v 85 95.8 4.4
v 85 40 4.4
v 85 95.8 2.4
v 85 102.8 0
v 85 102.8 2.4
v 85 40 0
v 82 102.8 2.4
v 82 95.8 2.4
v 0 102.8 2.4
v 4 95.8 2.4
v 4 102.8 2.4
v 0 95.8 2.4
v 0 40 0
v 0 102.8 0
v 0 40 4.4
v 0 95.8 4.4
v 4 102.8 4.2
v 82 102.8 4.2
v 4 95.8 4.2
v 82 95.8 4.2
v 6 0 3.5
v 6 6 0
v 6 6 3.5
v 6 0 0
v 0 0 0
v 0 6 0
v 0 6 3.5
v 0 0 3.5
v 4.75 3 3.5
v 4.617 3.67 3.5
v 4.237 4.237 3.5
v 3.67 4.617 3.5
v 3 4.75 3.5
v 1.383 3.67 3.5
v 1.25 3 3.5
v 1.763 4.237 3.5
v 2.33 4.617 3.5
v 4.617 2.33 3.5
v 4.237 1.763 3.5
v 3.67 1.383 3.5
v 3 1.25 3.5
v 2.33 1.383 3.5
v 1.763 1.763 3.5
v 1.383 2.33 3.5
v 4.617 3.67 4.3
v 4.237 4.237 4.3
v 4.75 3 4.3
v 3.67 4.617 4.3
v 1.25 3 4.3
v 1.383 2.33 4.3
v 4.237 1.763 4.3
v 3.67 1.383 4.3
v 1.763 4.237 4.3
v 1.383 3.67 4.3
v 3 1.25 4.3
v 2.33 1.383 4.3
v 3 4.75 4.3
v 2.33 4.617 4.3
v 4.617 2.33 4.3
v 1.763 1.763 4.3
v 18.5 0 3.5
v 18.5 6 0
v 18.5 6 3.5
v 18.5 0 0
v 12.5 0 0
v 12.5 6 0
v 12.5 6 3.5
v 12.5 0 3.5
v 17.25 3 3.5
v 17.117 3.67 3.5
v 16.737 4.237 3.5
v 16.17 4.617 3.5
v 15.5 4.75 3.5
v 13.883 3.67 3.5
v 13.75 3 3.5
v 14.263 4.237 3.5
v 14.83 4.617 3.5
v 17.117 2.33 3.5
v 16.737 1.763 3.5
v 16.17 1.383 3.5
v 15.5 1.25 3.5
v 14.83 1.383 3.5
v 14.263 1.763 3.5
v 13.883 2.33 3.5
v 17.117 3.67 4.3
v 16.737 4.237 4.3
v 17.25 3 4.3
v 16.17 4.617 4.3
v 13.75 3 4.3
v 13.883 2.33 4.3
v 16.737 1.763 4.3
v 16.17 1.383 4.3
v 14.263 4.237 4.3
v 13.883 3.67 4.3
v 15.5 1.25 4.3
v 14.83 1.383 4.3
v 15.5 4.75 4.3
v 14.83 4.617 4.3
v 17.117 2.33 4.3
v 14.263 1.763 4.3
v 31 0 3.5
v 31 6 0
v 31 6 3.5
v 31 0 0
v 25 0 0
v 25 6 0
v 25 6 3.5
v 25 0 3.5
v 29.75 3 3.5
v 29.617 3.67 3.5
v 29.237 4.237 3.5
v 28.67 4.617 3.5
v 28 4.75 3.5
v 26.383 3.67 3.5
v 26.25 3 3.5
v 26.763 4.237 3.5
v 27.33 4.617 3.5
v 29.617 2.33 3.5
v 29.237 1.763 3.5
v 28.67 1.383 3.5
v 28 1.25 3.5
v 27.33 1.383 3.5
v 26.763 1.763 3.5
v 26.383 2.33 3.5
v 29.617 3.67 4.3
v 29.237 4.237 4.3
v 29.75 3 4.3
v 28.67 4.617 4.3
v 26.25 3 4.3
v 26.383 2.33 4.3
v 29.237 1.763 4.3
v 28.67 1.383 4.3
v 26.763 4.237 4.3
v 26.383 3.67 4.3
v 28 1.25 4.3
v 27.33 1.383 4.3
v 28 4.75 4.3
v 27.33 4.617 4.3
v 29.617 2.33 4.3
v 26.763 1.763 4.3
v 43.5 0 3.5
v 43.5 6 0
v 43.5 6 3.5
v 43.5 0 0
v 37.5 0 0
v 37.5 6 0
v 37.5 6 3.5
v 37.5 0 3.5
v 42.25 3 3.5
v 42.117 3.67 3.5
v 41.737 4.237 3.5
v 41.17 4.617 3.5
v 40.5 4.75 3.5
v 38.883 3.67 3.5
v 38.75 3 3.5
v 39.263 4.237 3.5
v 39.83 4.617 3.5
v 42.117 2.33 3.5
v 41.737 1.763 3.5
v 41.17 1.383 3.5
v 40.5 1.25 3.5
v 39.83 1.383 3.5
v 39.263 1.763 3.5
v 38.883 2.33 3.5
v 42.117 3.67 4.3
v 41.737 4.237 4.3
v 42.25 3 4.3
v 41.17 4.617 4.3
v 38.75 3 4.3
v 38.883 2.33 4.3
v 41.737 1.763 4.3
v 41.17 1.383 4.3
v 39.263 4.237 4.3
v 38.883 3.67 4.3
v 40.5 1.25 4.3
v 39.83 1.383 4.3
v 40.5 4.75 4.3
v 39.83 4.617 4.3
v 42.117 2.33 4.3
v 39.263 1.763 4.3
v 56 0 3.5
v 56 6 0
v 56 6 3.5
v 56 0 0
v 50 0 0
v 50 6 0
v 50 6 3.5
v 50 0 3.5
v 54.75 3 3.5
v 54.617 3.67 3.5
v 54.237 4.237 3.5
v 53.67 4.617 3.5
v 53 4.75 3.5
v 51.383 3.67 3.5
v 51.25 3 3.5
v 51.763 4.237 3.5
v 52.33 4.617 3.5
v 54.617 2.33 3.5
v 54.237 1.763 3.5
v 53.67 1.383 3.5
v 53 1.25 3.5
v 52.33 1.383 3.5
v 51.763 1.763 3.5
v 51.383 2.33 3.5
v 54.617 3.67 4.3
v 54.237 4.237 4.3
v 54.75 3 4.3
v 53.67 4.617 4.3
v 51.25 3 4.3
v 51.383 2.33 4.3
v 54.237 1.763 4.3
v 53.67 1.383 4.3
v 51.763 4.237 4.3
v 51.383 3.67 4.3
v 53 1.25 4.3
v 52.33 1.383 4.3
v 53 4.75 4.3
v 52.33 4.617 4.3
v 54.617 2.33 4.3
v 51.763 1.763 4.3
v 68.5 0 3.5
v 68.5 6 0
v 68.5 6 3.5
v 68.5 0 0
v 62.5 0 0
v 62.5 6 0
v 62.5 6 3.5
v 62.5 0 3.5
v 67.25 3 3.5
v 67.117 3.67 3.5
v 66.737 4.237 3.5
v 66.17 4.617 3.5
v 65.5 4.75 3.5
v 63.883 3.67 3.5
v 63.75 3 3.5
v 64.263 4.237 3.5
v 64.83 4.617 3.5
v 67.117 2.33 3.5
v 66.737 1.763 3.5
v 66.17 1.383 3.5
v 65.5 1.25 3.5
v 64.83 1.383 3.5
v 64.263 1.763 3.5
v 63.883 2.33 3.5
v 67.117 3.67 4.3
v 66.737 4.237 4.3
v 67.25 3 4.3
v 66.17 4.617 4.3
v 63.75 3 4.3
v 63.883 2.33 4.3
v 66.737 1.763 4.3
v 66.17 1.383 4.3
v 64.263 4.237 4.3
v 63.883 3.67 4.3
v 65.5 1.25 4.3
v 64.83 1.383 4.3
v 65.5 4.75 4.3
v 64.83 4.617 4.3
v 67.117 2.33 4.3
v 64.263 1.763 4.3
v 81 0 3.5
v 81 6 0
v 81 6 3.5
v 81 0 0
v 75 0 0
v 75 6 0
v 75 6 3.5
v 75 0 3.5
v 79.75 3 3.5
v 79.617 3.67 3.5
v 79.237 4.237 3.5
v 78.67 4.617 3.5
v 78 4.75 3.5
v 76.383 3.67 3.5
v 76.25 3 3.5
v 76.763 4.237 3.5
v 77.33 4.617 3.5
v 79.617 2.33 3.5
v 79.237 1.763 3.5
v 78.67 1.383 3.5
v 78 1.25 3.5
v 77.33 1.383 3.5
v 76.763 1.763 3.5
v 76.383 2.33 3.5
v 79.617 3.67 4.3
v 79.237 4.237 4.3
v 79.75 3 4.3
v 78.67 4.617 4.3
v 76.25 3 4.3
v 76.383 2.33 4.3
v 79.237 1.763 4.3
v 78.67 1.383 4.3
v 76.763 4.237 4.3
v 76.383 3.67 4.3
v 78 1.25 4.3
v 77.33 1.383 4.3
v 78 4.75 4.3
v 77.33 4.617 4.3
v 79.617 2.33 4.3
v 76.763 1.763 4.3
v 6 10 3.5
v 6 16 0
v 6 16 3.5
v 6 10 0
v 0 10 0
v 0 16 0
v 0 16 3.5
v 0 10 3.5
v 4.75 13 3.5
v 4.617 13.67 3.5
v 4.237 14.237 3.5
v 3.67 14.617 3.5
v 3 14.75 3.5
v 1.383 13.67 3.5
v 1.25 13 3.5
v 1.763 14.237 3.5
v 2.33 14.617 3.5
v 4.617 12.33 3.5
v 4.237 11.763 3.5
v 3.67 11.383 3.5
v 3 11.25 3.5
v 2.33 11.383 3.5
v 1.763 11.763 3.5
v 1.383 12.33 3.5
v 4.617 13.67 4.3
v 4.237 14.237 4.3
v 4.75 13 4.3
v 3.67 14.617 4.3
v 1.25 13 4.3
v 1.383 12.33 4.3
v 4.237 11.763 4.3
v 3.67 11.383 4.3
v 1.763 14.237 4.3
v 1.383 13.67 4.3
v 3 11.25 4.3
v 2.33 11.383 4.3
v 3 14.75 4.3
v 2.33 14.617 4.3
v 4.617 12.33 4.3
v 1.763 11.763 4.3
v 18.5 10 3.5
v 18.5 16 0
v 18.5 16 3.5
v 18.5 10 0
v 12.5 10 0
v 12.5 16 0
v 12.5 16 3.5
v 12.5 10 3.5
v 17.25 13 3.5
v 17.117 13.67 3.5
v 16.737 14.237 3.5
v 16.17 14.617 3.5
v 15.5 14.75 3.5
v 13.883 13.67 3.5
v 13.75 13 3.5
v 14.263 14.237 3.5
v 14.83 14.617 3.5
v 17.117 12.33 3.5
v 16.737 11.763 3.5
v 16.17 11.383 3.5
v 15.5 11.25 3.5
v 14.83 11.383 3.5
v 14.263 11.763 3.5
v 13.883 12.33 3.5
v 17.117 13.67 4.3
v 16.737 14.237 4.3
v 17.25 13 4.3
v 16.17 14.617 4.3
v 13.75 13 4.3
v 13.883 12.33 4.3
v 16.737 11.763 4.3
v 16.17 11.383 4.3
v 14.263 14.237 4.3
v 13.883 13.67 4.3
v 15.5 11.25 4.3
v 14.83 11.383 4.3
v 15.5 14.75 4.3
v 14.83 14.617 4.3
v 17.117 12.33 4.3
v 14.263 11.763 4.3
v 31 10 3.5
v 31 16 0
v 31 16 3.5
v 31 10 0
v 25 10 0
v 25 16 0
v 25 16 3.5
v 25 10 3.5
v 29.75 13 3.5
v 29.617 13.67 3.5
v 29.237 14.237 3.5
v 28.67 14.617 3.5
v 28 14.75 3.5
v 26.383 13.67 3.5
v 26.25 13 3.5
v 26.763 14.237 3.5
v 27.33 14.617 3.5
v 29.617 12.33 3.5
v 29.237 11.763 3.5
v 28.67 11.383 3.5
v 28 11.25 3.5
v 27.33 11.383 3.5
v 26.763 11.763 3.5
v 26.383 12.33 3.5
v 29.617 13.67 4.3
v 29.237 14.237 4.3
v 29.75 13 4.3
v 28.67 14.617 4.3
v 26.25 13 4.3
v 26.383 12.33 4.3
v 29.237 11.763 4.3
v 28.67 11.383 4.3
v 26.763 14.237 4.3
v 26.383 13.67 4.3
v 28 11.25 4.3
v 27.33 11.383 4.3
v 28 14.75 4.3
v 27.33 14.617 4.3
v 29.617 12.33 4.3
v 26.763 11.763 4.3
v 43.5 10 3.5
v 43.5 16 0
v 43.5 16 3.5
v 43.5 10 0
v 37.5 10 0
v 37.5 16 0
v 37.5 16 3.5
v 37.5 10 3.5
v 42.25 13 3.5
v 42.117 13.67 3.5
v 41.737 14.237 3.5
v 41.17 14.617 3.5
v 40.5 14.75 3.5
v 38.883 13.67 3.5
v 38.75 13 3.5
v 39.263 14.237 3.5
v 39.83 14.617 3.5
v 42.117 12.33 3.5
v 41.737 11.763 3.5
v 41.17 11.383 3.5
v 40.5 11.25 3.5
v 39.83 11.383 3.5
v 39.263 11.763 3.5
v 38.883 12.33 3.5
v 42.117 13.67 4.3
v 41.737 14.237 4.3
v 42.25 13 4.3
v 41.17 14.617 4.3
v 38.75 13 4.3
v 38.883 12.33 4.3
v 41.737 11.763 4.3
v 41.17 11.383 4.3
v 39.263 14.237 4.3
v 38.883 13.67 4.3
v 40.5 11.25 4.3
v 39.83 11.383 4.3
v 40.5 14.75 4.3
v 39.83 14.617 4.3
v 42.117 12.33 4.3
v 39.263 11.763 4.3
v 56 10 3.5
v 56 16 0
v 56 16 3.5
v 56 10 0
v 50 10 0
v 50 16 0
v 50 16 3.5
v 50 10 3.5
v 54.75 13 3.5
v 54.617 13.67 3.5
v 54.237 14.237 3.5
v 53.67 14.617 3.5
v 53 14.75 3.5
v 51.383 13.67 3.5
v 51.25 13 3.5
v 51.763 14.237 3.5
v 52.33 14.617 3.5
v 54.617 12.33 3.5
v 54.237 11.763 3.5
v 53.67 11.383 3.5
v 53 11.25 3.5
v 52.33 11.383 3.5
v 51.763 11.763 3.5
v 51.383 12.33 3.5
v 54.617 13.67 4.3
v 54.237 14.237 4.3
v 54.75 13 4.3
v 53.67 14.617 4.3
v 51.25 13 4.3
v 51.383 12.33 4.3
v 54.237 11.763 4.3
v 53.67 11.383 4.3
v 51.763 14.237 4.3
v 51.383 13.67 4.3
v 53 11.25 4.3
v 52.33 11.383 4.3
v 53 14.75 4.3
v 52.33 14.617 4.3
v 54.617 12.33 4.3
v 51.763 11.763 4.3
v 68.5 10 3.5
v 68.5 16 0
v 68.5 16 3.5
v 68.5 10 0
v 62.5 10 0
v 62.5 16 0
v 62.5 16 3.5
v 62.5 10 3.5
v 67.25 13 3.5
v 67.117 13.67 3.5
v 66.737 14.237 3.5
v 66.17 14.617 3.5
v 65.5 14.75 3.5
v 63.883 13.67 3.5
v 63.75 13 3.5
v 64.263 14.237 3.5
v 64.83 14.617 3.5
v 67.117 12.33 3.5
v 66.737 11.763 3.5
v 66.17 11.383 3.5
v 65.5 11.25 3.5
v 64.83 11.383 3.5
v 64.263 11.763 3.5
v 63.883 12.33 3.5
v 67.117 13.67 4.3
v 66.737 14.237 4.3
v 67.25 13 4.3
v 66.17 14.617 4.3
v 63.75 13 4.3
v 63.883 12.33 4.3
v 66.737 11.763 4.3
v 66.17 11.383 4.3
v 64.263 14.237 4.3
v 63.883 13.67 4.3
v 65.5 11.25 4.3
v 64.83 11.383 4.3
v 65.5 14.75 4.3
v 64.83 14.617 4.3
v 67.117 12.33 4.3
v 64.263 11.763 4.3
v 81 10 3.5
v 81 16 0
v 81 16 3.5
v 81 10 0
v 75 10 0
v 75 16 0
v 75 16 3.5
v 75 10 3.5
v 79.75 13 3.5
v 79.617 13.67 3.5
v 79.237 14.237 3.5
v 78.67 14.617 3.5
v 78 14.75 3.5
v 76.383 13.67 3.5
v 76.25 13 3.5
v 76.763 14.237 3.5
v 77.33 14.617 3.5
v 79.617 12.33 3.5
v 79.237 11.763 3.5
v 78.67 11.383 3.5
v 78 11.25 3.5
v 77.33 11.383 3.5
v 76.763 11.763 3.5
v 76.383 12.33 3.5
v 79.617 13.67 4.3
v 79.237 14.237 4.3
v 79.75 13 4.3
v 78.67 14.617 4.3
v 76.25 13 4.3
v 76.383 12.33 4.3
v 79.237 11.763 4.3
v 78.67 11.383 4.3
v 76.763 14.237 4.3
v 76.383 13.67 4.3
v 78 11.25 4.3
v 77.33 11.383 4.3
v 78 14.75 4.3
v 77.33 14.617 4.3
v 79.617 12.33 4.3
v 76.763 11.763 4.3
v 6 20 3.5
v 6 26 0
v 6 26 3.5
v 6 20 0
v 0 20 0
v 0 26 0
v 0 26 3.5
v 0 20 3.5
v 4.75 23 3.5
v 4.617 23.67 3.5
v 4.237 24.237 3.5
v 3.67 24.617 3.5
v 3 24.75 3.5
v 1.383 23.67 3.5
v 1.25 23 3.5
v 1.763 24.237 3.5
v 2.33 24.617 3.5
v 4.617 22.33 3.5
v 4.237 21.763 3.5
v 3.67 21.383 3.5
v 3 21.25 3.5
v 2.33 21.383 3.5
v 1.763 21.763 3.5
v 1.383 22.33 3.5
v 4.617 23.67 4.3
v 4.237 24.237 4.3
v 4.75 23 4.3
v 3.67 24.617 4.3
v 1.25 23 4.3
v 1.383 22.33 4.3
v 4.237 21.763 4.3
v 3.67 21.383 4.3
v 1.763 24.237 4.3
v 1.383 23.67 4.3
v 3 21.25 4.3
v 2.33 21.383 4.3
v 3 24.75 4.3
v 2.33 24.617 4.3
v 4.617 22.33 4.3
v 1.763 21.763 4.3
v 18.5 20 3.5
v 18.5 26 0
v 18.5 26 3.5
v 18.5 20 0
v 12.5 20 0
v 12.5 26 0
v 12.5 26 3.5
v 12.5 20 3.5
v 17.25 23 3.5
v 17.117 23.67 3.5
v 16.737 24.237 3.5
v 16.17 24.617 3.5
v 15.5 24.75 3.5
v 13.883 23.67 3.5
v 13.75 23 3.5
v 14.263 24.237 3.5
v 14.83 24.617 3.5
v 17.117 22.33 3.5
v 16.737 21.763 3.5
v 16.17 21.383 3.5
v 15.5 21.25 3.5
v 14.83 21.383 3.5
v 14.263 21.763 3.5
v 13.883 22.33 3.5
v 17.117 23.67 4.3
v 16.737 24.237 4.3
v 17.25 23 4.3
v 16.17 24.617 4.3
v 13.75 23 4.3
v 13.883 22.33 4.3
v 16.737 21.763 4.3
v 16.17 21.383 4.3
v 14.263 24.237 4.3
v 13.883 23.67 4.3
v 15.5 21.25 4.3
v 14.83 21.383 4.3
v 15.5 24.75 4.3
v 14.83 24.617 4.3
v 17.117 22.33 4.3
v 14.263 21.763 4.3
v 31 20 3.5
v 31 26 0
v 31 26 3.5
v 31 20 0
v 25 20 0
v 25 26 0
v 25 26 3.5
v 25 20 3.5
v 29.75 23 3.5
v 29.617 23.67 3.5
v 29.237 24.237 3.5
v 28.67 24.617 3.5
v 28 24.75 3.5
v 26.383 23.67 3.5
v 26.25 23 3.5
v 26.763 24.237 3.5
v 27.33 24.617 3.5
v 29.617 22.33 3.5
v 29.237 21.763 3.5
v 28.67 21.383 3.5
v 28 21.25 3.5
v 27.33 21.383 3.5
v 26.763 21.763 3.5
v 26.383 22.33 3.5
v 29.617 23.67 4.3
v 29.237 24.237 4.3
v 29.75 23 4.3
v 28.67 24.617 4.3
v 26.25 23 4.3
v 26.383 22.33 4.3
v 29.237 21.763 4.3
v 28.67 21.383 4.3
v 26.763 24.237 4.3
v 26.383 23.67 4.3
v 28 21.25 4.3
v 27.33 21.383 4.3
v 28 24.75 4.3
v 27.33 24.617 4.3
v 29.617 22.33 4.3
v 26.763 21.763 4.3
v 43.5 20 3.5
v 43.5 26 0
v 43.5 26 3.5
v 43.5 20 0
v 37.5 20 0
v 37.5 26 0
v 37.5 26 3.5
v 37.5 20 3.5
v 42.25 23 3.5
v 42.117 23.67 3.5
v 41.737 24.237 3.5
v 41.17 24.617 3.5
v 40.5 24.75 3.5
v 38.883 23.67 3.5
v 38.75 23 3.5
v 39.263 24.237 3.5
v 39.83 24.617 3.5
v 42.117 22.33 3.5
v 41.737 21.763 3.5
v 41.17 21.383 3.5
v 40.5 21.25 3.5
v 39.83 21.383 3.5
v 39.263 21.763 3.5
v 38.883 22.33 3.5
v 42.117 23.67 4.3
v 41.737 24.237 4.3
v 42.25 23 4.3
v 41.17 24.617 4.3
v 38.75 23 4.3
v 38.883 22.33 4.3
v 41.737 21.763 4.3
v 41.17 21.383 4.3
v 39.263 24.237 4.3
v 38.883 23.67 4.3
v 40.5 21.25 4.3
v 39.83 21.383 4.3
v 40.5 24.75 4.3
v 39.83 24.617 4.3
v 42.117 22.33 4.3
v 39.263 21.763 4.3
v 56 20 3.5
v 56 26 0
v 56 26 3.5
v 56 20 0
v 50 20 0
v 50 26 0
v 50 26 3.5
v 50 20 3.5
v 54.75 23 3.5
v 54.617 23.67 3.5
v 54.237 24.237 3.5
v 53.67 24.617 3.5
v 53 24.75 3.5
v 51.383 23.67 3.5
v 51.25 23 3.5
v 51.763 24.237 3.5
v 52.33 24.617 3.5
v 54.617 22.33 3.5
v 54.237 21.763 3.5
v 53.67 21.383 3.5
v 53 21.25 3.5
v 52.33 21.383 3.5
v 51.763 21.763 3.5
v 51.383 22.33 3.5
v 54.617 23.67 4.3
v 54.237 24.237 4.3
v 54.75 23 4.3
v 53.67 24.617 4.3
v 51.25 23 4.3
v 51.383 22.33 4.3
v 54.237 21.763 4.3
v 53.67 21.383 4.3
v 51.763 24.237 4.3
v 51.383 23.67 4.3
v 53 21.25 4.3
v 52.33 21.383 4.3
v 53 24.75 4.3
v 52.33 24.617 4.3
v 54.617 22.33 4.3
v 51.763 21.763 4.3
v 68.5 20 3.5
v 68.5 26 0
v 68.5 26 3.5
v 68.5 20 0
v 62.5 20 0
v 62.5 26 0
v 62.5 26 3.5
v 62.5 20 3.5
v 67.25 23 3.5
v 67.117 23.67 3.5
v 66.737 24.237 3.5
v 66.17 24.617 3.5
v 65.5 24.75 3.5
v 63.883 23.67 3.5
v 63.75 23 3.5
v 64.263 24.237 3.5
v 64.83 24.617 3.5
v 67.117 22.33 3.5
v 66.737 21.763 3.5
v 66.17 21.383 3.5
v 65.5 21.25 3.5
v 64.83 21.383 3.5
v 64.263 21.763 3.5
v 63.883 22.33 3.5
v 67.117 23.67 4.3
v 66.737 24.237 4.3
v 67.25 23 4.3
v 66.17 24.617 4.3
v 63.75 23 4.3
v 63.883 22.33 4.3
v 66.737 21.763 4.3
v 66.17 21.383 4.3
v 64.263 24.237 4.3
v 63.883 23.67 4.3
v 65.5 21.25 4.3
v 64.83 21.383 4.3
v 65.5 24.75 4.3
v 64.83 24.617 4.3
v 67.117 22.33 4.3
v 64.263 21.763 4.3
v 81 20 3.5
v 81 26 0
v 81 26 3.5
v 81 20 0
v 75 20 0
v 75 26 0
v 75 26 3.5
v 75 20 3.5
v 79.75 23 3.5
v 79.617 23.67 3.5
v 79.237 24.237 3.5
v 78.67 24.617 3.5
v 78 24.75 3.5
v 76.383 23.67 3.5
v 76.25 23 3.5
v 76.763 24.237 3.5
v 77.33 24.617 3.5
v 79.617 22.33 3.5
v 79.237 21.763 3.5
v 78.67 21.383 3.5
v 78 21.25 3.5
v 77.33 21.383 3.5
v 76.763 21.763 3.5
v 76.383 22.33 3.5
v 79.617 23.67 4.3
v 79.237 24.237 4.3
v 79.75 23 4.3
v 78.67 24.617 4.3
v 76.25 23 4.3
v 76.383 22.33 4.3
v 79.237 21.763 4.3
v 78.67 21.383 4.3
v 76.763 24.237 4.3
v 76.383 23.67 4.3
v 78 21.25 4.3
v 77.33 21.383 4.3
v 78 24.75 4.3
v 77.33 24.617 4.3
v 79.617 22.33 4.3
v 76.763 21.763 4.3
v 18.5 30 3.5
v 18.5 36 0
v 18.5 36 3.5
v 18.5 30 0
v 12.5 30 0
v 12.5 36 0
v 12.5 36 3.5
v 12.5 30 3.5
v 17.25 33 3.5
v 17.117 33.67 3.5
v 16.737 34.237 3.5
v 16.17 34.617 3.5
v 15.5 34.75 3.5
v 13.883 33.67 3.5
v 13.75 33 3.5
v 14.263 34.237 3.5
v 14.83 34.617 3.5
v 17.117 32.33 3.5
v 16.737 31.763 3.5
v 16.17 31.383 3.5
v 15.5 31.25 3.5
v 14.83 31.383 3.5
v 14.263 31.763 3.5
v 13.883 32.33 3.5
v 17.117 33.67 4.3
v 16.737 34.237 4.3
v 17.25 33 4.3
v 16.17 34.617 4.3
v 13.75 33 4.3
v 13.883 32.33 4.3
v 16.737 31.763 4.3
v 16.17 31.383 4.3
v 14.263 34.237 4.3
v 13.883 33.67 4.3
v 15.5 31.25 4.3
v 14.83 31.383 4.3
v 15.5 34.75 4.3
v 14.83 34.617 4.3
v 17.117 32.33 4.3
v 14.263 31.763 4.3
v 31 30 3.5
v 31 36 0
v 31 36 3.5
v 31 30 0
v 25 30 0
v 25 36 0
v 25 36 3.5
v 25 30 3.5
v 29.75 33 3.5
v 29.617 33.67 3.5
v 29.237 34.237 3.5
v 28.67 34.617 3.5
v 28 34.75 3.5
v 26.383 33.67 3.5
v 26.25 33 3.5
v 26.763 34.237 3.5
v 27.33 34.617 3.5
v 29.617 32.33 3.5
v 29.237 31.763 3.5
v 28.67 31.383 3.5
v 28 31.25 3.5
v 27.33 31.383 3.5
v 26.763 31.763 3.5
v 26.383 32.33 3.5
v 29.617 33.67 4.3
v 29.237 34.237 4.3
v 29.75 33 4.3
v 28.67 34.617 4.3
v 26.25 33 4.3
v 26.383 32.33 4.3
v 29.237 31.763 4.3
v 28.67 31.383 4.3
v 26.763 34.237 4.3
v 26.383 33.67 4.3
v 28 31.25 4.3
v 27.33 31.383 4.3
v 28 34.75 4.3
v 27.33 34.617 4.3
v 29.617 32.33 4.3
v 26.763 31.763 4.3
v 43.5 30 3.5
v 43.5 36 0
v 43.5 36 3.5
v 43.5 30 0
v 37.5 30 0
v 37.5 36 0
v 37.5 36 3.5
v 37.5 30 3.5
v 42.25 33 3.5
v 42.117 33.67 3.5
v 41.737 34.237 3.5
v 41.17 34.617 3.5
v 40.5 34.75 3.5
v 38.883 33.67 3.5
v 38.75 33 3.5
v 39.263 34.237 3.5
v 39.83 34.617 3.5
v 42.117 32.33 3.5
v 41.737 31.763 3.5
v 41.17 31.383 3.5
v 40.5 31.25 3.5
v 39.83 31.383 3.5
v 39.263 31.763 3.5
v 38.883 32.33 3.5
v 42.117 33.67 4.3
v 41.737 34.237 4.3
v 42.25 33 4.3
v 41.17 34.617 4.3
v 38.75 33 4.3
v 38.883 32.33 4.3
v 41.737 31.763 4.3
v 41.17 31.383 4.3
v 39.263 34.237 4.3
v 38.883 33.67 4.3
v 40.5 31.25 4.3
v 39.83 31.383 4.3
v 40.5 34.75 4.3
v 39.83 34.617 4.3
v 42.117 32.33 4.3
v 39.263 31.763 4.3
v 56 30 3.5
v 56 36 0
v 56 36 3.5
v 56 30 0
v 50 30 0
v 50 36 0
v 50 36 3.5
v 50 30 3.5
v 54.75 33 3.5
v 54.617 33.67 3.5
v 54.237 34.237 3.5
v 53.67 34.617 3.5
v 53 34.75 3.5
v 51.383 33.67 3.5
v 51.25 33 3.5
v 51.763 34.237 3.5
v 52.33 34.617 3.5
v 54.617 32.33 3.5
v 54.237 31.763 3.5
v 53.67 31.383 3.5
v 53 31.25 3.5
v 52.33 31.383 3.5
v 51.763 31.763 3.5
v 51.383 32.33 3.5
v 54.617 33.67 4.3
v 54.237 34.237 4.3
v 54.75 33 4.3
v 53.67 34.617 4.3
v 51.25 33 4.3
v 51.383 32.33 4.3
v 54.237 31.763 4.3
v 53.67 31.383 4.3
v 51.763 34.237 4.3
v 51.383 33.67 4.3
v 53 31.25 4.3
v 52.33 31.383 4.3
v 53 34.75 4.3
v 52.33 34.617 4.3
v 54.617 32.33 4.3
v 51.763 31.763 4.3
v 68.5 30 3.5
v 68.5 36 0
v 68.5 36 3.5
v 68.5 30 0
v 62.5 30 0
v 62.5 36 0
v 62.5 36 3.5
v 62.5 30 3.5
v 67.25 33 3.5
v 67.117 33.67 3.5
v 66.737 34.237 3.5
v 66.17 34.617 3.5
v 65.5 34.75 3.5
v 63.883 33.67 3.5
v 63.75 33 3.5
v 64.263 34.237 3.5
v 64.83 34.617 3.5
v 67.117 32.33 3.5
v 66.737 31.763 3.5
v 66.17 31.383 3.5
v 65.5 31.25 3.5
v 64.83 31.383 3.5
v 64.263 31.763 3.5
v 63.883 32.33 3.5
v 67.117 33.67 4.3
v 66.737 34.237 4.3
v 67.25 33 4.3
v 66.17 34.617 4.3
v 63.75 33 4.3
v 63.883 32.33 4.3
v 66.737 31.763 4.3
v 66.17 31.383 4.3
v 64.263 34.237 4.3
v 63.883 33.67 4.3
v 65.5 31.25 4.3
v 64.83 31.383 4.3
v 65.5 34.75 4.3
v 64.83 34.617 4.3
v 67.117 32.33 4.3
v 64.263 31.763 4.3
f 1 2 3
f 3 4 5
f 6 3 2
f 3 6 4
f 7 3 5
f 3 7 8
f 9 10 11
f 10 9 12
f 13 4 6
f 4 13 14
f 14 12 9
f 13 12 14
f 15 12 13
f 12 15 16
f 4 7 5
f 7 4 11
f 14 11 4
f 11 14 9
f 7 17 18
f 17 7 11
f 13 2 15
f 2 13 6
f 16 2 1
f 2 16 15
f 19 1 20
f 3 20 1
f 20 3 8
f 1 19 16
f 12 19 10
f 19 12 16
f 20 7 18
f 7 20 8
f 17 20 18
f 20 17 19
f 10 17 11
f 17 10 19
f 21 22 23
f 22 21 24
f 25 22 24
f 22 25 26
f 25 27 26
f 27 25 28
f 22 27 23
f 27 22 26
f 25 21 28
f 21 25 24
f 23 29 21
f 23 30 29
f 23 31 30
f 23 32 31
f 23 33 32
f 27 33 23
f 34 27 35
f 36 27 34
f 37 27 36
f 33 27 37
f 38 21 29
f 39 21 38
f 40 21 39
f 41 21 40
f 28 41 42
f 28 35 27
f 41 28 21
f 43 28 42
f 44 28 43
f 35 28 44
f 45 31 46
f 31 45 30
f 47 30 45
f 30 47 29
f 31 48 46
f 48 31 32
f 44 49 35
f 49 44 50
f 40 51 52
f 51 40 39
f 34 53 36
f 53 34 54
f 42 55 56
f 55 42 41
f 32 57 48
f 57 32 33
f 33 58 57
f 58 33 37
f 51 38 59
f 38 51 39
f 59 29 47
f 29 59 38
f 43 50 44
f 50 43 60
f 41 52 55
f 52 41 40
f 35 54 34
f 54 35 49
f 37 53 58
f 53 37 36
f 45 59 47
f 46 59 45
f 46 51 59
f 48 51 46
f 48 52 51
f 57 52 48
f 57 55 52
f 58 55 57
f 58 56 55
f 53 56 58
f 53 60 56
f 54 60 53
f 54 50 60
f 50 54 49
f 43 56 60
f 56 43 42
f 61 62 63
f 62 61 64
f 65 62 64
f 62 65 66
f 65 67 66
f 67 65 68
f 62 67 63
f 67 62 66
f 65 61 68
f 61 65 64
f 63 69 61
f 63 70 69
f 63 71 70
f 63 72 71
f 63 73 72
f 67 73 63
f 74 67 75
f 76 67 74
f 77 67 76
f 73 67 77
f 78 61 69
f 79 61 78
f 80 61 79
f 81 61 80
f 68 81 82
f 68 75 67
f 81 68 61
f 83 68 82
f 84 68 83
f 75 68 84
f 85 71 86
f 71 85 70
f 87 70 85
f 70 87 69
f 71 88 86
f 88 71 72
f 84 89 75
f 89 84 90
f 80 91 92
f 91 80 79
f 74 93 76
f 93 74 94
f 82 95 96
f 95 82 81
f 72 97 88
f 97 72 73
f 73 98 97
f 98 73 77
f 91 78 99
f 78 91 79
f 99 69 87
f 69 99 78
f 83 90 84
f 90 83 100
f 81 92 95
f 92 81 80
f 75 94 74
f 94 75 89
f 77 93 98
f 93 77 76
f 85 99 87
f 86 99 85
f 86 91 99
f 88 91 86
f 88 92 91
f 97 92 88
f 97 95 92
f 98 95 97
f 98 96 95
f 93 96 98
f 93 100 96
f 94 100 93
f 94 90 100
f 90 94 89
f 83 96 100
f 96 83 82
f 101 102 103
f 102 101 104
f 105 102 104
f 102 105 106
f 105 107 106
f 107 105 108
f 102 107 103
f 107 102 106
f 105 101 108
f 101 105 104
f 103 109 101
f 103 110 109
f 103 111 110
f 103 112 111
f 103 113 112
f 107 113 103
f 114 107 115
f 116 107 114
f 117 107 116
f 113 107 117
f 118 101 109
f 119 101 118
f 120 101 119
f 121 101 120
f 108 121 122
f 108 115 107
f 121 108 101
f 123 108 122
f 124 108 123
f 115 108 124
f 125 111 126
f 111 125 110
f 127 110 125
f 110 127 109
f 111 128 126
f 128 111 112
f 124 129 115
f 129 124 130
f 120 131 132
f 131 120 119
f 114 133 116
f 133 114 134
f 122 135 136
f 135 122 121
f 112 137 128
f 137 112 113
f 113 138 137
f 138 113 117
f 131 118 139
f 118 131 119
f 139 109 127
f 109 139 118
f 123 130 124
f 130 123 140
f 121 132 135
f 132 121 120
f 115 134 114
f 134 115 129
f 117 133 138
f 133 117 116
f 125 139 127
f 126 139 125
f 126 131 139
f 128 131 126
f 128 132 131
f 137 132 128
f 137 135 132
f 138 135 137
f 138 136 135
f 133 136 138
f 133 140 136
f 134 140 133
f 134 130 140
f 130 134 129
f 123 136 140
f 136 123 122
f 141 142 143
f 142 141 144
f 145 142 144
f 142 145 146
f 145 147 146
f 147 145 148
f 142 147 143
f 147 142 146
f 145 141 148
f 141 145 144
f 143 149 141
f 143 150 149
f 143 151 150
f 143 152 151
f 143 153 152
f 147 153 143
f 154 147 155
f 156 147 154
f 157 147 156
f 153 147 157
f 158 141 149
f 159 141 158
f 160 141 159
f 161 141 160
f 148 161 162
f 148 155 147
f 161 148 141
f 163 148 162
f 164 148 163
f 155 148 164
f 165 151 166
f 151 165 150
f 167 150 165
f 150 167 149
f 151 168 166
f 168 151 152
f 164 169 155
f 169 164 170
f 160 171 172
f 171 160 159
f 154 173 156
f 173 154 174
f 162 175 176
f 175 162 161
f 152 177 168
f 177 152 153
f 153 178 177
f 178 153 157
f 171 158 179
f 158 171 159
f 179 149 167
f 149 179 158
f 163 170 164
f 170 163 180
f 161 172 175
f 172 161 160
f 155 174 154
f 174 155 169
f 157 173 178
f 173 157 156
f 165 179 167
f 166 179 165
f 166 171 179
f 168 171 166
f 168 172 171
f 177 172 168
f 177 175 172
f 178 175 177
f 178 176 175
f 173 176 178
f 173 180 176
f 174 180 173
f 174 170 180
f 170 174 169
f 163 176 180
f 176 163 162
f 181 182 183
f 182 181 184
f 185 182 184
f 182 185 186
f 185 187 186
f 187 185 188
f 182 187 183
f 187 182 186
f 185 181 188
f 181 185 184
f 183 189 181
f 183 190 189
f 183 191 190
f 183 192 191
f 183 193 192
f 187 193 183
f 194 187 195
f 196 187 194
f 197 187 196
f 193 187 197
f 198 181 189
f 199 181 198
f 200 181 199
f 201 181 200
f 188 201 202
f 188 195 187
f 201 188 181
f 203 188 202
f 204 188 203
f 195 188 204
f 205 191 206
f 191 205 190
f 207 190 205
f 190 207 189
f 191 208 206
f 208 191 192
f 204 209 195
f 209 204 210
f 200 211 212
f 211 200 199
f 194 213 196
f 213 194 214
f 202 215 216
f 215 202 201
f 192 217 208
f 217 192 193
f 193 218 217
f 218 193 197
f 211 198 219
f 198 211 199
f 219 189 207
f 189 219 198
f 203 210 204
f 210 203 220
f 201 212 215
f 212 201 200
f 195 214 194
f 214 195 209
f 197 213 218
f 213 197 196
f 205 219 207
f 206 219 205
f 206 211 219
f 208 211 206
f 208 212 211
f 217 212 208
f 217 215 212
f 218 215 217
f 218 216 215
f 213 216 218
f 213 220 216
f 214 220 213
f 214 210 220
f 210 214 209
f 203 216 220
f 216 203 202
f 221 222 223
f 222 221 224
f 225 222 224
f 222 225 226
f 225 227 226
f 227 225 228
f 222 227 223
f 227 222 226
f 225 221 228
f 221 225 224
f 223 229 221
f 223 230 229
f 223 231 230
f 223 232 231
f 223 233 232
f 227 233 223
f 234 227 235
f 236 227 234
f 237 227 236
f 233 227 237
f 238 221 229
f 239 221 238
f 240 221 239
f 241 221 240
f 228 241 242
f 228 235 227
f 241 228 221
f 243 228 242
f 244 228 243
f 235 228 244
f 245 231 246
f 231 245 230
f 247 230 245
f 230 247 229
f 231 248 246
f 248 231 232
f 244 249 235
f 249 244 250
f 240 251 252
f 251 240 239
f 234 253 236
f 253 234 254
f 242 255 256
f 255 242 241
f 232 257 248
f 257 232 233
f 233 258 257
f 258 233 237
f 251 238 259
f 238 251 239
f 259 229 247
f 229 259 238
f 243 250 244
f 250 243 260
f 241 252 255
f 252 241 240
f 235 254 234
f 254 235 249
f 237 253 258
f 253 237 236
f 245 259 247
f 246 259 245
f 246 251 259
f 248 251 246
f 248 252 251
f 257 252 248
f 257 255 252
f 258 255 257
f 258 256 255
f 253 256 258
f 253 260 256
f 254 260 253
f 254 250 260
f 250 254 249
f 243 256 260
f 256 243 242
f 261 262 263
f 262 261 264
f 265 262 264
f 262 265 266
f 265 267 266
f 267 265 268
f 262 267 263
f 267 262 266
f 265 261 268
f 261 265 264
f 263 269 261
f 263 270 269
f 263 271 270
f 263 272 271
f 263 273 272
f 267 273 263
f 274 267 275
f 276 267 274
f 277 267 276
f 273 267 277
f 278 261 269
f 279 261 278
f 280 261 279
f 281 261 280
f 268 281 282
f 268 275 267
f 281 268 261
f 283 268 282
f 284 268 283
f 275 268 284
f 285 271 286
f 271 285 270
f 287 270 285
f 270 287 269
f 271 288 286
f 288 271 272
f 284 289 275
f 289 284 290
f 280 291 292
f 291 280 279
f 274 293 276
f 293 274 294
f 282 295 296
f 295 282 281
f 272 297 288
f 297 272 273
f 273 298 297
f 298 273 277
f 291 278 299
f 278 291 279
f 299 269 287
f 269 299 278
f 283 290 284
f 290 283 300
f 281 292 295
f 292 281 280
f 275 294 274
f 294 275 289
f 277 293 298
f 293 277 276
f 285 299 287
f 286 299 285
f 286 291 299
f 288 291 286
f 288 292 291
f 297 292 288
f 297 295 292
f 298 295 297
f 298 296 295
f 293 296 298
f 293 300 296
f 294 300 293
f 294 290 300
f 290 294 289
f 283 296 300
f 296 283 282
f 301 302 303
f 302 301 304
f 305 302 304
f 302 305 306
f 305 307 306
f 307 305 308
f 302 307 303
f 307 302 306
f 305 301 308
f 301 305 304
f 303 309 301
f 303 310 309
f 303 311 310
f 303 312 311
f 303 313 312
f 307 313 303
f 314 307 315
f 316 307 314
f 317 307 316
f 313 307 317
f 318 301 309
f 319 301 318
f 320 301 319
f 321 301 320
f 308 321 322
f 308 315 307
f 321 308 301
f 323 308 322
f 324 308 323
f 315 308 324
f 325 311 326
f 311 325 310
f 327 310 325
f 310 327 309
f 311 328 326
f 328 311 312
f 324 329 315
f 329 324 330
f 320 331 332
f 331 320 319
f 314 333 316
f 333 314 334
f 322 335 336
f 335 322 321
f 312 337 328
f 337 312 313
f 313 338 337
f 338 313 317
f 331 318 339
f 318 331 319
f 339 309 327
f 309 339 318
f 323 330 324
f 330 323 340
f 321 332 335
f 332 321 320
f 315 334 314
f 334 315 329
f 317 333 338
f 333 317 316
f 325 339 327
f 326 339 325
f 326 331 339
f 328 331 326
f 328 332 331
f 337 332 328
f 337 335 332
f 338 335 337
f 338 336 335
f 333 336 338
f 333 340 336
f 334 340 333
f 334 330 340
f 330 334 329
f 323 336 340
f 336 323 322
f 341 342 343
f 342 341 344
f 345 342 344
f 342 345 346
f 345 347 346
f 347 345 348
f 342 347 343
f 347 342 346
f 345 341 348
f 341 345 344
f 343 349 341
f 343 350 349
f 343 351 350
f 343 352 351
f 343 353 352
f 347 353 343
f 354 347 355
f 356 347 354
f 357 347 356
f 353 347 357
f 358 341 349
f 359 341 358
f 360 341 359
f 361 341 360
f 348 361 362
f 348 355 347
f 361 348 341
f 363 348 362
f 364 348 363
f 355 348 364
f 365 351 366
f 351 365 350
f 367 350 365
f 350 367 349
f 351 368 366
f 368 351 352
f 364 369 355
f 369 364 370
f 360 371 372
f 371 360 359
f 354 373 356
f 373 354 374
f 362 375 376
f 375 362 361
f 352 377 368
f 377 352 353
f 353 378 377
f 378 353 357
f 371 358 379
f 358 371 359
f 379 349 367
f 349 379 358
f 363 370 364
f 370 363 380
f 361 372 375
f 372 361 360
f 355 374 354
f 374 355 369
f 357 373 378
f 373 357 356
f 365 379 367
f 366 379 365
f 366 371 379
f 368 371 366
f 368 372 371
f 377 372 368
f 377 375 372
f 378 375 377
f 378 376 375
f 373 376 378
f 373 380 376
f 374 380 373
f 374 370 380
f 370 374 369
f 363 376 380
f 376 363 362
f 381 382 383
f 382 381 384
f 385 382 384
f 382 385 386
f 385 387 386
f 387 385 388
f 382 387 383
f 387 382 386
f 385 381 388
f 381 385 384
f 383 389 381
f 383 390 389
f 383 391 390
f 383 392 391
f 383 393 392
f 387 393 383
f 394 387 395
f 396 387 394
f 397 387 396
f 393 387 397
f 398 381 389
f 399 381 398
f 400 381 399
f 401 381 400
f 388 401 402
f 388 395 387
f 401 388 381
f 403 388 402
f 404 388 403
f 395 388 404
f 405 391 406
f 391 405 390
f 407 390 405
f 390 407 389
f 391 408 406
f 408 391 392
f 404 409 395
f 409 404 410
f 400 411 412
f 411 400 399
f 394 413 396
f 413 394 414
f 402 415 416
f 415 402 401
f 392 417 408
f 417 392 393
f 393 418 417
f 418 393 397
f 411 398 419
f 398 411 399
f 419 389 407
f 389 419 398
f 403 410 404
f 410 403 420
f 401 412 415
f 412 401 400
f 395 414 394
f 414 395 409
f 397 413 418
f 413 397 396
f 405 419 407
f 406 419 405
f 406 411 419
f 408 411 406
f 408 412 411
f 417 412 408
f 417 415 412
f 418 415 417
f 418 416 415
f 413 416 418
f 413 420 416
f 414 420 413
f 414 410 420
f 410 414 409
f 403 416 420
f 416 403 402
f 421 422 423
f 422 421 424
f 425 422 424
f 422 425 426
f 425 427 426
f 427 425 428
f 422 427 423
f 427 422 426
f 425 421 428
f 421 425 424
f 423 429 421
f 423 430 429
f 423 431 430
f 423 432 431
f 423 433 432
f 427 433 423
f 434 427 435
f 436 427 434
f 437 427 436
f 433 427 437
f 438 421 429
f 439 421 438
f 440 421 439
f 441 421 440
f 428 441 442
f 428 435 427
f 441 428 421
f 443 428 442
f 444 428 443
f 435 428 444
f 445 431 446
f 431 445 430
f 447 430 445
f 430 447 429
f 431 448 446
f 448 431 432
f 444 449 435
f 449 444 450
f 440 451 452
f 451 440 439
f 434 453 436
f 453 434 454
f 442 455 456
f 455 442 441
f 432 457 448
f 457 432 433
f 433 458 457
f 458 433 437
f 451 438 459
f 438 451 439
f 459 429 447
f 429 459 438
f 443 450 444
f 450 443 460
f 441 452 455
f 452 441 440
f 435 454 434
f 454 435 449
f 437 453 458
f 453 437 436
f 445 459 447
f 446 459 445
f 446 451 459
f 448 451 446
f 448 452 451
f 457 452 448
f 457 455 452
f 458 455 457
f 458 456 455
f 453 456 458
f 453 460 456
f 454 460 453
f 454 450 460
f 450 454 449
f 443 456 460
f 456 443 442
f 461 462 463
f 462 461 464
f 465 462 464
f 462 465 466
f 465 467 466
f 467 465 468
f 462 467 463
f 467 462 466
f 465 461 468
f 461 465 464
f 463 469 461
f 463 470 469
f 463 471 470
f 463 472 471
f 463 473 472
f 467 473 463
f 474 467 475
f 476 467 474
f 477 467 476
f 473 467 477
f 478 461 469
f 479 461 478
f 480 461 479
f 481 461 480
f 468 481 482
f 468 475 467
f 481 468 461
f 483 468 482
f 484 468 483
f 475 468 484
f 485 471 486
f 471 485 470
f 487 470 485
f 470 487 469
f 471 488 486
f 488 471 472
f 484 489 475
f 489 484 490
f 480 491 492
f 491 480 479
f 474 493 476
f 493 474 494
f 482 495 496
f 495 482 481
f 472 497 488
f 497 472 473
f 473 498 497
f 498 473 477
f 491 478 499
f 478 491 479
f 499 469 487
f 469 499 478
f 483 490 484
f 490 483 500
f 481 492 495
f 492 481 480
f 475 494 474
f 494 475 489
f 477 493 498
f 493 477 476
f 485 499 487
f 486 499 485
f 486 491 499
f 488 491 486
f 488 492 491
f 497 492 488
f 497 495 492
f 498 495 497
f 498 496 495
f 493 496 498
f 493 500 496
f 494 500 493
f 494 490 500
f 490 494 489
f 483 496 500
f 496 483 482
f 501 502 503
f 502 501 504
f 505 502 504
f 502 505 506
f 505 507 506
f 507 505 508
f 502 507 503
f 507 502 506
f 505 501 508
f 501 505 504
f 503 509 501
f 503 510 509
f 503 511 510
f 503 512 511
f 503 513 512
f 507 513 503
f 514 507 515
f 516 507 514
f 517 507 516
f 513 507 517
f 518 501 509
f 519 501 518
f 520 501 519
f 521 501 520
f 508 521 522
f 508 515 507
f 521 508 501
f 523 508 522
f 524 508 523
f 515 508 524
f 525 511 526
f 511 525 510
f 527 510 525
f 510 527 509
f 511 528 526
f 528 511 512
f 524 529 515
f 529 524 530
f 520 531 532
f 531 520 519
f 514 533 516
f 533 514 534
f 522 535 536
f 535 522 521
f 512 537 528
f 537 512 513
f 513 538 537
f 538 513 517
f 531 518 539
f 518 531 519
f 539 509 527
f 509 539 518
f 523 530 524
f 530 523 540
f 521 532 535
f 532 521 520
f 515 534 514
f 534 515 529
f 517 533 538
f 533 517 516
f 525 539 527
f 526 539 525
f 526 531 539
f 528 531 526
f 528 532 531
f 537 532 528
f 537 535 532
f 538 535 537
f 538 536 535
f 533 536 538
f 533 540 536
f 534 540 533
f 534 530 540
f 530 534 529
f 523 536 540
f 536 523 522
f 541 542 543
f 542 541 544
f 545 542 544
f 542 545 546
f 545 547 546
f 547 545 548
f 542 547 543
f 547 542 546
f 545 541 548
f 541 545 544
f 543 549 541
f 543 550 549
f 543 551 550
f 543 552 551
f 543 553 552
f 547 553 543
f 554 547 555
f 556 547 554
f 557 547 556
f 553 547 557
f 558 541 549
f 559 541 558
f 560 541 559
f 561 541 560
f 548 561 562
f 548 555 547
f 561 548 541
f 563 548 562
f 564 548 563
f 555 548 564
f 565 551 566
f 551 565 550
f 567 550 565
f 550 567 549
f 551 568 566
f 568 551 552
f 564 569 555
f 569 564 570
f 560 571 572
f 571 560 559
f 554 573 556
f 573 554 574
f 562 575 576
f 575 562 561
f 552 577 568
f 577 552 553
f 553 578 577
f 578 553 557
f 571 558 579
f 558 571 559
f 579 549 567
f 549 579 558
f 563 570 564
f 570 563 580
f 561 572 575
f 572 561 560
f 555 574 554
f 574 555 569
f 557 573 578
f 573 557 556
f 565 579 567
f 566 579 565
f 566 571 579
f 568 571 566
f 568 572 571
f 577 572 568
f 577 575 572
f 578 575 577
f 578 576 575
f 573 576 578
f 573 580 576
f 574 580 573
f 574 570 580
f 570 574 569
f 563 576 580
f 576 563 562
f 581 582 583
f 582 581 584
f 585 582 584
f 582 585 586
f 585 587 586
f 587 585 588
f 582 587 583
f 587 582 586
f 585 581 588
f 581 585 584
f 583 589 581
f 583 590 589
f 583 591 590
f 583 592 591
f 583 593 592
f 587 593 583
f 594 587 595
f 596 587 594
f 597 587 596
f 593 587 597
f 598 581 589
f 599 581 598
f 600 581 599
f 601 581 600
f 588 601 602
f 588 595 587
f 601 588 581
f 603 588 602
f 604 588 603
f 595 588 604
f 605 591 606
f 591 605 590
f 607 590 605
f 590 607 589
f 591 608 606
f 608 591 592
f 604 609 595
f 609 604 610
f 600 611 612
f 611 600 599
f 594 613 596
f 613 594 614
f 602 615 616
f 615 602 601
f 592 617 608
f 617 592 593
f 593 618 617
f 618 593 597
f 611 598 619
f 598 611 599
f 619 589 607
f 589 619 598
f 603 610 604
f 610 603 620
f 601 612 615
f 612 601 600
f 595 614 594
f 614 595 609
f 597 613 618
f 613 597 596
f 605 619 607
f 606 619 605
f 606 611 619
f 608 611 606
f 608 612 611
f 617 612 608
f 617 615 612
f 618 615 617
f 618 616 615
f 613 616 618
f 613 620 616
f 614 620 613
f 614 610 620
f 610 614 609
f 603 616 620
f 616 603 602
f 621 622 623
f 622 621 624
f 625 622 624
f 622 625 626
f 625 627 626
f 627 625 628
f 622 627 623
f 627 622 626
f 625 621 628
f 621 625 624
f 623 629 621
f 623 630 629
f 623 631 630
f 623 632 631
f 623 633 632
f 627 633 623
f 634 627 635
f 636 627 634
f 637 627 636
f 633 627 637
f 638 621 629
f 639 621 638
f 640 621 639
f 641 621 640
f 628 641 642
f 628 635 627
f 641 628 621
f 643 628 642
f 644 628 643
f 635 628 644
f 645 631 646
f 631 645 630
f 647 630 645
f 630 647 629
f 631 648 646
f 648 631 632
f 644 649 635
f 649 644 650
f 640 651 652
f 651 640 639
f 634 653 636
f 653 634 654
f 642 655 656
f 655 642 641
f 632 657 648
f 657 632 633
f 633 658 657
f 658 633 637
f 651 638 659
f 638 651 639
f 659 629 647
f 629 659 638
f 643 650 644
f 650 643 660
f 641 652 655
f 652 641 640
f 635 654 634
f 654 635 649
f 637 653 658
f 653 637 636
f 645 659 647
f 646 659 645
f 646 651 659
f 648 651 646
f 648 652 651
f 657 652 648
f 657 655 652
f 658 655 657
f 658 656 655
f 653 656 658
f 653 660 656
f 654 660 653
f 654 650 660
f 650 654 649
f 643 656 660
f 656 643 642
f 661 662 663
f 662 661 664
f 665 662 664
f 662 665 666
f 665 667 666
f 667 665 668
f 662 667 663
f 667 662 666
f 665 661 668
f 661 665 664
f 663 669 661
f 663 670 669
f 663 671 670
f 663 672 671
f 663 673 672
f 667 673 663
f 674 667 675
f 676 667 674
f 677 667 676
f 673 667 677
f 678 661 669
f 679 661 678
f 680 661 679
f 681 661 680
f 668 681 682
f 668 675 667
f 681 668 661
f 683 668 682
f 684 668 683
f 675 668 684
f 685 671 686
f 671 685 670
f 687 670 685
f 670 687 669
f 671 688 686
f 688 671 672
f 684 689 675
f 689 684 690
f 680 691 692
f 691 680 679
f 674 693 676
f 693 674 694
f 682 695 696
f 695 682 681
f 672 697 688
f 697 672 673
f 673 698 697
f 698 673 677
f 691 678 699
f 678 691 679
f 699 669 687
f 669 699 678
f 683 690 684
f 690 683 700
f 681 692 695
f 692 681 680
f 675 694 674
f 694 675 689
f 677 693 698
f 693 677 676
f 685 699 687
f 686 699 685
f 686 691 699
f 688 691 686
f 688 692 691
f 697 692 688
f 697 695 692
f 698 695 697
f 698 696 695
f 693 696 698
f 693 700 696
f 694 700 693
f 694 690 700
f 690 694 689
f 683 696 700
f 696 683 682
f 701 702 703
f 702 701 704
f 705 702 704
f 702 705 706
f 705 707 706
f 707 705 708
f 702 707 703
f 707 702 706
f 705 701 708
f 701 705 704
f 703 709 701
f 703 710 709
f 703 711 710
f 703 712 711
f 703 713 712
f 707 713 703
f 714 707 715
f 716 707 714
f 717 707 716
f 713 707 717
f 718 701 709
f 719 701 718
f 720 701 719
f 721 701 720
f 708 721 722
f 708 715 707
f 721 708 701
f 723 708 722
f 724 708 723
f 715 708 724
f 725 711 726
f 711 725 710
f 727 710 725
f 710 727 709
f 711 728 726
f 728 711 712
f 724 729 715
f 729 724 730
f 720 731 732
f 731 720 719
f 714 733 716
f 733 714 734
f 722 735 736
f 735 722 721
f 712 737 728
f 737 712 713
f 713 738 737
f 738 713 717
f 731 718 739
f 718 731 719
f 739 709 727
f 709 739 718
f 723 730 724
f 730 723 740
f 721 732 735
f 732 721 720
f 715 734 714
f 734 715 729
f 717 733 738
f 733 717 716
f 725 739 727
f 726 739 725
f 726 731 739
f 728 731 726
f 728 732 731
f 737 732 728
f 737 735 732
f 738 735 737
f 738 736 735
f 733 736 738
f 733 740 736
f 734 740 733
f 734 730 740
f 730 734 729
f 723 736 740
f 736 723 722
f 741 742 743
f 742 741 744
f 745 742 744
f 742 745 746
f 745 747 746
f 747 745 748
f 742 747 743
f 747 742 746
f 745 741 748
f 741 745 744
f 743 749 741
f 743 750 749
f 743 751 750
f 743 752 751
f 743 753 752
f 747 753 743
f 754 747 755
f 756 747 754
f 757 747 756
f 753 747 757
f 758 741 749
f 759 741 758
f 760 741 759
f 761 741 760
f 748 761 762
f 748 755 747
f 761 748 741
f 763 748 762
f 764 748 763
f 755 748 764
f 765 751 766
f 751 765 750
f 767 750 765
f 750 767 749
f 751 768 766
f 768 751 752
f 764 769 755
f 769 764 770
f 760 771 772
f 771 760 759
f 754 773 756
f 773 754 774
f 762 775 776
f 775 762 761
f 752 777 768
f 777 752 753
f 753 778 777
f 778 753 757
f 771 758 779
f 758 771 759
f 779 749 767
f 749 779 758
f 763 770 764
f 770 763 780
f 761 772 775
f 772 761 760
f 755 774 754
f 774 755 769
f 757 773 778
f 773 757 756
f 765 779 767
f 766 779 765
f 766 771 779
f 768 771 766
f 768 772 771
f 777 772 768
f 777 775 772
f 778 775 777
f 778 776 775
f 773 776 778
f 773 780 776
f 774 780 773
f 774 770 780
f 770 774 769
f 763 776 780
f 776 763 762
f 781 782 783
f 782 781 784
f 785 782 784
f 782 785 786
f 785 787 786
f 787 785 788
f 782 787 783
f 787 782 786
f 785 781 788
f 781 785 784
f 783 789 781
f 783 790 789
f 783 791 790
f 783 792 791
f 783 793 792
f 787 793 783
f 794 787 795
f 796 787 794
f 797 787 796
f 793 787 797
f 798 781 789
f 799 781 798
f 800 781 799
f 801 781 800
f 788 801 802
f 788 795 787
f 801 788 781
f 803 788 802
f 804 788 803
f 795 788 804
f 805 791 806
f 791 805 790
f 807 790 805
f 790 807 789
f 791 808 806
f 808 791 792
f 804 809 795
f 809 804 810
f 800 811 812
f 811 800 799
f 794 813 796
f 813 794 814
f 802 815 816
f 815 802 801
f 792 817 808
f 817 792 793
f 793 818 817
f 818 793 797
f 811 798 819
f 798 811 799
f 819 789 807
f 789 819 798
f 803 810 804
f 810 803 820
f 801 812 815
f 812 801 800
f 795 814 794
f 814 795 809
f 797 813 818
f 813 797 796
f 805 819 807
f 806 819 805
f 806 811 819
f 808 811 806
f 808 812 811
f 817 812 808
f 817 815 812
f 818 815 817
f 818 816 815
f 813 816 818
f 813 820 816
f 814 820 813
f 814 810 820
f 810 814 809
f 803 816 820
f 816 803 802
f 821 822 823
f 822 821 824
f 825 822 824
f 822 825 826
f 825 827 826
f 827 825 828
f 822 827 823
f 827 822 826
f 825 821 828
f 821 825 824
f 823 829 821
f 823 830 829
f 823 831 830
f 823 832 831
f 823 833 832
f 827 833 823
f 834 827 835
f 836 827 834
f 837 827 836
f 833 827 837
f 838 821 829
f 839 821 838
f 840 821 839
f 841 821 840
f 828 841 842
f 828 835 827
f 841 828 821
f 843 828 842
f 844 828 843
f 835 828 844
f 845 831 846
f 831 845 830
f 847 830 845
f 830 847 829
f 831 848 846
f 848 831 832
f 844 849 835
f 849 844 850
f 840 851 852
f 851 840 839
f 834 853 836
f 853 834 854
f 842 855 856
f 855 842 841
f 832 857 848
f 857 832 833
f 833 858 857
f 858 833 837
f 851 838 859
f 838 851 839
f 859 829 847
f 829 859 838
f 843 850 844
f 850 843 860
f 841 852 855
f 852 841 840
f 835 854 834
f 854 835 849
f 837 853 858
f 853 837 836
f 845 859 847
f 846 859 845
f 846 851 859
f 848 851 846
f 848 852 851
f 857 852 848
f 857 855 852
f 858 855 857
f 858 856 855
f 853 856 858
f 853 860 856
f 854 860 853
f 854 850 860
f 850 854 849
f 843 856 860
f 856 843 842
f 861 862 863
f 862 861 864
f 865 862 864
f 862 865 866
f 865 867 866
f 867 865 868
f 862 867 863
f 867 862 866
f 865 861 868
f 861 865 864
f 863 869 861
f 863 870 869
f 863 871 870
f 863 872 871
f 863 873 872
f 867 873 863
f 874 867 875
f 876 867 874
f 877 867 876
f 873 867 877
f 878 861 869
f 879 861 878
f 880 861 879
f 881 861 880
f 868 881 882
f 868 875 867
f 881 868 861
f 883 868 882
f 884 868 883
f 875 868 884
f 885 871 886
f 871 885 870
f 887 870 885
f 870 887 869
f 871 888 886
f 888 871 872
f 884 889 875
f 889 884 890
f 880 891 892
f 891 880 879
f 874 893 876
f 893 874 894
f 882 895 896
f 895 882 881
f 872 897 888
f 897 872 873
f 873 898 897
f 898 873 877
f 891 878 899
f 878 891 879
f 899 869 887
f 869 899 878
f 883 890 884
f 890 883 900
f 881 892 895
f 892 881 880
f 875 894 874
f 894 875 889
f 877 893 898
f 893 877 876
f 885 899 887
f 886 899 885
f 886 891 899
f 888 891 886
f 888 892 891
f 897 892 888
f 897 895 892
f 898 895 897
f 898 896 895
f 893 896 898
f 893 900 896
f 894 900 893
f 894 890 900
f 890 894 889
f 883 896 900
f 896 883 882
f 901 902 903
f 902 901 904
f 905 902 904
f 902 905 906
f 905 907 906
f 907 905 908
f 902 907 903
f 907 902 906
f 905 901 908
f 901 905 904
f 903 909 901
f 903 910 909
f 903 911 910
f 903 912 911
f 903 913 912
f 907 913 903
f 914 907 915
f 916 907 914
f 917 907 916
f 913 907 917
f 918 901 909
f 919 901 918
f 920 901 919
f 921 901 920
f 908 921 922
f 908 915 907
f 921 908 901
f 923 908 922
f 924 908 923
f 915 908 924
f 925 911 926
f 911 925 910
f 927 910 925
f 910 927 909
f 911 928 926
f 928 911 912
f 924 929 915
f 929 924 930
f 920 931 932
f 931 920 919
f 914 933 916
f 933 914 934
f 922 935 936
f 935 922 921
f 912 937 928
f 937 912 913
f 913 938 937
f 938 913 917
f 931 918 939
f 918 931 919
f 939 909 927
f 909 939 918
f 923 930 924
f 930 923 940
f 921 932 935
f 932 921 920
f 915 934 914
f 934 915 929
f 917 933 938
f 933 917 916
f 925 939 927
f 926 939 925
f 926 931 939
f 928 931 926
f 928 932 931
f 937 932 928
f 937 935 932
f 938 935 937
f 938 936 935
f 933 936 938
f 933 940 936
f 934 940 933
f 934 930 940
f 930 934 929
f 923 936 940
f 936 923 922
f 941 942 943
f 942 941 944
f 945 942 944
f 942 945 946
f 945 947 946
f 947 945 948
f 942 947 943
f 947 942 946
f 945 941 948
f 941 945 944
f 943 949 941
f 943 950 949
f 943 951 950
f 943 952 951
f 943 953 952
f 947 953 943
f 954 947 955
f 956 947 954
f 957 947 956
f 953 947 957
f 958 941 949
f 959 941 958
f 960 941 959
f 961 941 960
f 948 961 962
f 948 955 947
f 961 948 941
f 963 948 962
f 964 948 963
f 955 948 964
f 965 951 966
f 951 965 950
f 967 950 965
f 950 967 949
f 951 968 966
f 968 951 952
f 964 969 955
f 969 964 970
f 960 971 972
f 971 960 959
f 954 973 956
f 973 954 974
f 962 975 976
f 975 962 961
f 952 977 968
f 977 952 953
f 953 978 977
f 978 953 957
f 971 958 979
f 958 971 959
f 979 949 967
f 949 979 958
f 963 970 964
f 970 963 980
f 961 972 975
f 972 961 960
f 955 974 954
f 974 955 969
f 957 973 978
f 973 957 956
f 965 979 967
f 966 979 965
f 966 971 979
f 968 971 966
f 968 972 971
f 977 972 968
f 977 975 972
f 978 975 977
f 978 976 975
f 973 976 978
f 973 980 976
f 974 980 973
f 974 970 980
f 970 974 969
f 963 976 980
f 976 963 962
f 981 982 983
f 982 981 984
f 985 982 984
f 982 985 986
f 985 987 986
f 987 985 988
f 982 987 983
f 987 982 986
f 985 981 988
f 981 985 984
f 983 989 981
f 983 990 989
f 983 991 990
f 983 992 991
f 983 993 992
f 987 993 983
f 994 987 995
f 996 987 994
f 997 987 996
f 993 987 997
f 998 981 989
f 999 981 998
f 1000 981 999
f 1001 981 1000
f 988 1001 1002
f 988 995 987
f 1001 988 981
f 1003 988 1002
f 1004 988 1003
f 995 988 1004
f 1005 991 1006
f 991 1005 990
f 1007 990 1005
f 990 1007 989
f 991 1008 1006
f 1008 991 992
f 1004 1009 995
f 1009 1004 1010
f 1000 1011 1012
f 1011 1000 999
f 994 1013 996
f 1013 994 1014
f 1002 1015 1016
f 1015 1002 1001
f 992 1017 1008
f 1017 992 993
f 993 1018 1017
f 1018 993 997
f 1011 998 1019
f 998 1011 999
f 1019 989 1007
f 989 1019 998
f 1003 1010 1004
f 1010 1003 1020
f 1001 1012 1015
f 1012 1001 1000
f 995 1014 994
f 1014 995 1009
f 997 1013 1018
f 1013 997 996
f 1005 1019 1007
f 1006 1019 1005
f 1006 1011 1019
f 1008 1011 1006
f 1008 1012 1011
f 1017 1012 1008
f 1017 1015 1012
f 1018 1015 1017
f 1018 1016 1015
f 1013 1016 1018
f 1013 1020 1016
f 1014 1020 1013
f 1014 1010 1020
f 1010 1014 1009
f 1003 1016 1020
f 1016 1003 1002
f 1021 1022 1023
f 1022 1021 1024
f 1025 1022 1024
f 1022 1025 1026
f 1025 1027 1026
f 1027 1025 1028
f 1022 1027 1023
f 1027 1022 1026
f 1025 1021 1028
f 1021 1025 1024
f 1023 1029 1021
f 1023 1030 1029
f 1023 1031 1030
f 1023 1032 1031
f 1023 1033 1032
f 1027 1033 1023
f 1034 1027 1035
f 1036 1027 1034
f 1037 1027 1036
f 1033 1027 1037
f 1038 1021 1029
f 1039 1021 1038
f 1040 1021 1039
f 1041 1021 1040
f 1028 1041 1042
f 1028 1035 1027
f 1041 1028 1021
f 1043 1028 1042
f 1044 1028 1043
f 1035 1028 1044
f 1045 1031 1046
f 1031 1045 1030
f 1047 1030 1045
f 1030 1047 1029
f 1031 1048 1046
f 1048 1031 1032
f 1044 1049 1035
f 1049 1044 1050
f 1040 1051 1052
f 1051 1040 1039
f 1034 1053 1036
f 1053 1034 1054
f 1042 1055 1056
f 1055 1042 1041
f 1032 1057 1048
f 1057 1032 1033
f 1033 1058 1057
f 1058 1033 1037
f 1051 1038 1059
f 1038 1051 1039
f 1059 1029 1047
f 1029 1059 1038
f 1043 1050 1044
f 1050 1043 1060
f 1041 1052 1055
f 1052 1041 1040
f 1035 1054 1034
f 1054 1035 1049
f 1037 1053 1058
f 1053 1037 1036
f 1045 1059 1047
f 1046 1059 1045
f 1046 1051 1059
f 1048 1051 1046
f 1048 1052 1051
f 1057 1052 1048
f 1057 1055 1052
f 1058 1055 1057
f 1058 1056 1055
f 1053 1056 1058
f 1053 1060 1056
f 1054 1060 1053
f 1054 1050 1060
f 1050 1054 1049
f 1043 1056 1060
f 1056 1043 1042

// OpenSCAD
SEGGIES=16;

module display()
{
    union()
    {
        // Backlight
        color("Gainsboro")
        cube([85, 62.8, 2.4]);

        // LCD
        color("DarkSeaGreen")
        translate([0, 0, 2.4])
        cube([85, 55.8, 2]);
        
        // Top rubbery bit
        color([0.1, 0.1, 0.1, 1])
        translate([4, 55.8, 2.4])
        cube([78, 7, 1.8]);
    }
}

module pushbutton()
{
    union()
    {
        // Body
        color([0.1, 0.1, 0.1, 1])
        cube([6, 6, 3.4]);

        // Cap
        color("Silver")
        translate([0, 0, 3.4])
        cube([6, 6, 0.1]);

        // Actuator
        color([0.1, 0.1, 0.1, 1])
        translate([3, 3, 0])
        cylinder(r=(3.5/2), h=4.3, $fn=SEGGIES);
    }
}

module keyboard()
{
    KEYSPACEV=10;
    KEYSPACEH=12.5;

    for(r=[0:2])
    {
        translate([0, r*KEYSPACEV, 0])
        for(i=[0:6])
        {
            translate([i*KEYSPACEH, 0, 0])
            pushbutton();
        }
    }
        
    translate([KEYSPACEH, KEYSPACEV*3, 0])
    for(i=[0:4])
    {
        translate([i*KEYSPACEH, 0, 0])
        pushbutton();
    }
}

module usb_a()
{
    union()
    {
        color("Silver")
        difference()
        {
            union()
            {
                // Shell
                cube([13.1, 14.1, 5.7]);
                
                // Little lip at the front
                translate([-0.7, 0, -0.7]) 
                cube([14.5, .4, 7.1]);
            }
            
            translate([0.2, -0.1, 0.2]) 
            cube([12.7, 14.0, 5.3]);
        }
        
        // Dingly tab
        color([0.1, 0.1, 0.1, 1])
        translate([0.5, 0, 3]) 
        cube([12, 13, 1.7]);
    }
}

module ethernet()
{
    color("Silver")
    difference()
    {
        // Shell
        cube([15.75, 21.72, 13.35]);
        
        // Jack
        translate([1.9, -0.1, 4.1])
        cube([11.95, 20, 6.7]);
    }
}

module usb_micro()
{
    // Jack
    color("Silver")
    cube([7.86, 5.1, 3.1]);

}



translate([0, 40, 0])
display();
keyboard();
